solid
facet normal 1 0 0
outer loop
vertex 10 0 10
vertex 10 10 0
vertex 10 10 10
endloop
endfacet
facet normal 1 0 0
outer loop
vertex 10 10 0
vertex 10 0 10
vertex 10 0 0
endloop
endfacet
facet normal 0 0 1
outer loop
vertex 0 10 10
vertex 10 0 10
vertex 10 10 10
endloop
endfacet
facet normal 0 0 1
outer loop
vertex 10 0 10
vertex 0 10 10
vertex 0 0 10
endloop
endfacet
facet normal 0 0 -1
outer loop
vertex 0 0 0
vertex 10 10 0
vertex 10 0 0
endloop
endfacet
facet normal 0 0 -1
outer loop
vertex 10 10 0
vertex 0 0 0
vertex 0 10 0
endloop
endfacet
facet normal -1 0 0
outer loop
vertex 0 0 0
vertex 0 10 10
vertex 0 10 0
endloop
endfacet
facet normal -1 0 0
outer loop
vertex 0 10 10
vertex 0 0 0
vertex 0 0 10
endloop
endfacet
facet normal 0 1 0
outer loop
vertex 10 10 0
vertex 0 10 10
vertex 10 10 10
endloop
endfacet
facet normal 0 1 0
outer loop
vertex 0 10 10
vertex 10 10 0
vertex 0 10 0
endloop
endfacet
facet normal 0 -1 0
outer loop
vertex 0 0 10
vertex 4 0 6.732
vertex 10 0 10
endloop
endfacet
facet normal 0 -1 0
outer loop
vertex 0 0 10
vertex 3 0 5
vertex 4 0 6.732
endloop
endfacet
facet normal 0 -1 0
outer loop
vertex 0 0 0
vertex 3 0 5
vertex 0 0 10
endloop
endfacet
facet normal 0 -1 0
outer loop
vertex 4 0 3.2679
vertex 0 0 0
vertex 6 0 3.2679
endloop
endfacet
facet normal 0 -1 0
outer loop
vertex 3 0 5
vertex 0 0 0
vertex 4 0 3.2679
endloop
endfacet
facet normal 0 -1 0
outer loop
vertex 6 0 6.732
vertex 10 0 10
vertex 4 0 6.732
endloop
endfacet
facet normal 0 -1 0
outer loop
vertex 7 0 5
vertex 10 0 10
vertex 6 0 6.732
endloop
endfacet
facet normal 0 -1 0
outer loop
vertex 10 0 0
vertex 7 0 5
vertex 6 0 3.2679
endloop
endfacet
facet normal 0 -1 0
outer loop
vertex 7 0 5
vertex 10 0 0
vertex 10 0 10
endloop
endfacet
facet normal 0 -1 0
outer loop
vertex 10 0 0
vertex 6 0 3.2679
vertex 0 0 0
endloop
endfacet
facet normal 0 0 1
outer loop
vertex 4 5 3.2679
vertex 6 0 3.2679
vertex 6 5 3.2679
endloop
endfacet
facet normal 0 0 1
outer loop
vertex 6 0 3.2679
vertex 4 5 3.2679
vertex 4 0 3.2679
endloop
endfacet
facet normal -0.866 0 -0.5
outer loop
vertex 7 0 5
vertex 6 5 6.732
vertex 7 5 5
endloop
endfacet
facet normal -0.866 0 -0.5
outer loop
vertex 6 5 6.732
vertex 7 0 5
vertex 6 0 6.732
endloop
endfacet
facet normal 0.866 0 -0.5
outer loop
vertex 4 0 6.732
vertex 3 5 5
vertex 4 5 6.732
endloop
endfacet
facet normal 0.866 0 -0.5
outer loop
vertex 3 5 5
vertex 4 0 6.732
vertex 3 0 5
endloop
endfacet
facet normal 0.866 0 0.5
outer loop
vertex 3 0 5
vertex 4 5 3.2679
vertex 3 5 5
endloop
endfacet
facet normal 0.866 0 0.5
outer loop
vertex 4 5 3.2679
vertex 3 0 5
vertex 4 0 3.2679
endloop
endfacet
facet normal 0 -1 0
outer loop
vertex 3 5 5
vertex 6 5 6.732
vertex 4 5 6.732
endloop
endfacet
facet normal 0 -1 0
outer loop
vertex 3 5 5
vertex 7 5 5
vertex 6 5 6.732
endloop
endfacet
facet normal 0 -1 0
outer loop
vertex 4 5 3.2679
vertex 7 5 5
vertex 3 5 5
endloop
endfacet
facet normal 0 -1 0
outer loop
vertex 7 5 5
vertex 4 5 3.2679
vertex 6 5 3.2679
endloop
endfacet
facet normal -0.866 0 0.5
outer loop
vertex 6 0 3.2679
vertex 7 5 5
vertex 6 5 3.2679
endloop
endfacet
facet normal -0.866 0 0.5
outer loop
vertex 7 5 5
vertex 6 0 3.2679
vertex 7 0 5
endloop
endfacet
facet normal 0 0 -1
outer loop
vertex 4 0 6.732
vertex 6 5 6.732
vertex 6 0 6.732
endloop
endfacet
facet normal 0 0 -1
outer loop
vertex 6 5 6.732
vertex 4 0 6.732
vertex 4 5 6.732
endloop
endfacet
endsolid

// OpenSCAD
difference() {
  cube([10, 10, 10]);
  translate([5, 5, 5]) {
    rotate(v = [1, 0, 0], a=90) {
      cylinder(h = 12, r = 2, $fn = 6);
    }
  }

}
